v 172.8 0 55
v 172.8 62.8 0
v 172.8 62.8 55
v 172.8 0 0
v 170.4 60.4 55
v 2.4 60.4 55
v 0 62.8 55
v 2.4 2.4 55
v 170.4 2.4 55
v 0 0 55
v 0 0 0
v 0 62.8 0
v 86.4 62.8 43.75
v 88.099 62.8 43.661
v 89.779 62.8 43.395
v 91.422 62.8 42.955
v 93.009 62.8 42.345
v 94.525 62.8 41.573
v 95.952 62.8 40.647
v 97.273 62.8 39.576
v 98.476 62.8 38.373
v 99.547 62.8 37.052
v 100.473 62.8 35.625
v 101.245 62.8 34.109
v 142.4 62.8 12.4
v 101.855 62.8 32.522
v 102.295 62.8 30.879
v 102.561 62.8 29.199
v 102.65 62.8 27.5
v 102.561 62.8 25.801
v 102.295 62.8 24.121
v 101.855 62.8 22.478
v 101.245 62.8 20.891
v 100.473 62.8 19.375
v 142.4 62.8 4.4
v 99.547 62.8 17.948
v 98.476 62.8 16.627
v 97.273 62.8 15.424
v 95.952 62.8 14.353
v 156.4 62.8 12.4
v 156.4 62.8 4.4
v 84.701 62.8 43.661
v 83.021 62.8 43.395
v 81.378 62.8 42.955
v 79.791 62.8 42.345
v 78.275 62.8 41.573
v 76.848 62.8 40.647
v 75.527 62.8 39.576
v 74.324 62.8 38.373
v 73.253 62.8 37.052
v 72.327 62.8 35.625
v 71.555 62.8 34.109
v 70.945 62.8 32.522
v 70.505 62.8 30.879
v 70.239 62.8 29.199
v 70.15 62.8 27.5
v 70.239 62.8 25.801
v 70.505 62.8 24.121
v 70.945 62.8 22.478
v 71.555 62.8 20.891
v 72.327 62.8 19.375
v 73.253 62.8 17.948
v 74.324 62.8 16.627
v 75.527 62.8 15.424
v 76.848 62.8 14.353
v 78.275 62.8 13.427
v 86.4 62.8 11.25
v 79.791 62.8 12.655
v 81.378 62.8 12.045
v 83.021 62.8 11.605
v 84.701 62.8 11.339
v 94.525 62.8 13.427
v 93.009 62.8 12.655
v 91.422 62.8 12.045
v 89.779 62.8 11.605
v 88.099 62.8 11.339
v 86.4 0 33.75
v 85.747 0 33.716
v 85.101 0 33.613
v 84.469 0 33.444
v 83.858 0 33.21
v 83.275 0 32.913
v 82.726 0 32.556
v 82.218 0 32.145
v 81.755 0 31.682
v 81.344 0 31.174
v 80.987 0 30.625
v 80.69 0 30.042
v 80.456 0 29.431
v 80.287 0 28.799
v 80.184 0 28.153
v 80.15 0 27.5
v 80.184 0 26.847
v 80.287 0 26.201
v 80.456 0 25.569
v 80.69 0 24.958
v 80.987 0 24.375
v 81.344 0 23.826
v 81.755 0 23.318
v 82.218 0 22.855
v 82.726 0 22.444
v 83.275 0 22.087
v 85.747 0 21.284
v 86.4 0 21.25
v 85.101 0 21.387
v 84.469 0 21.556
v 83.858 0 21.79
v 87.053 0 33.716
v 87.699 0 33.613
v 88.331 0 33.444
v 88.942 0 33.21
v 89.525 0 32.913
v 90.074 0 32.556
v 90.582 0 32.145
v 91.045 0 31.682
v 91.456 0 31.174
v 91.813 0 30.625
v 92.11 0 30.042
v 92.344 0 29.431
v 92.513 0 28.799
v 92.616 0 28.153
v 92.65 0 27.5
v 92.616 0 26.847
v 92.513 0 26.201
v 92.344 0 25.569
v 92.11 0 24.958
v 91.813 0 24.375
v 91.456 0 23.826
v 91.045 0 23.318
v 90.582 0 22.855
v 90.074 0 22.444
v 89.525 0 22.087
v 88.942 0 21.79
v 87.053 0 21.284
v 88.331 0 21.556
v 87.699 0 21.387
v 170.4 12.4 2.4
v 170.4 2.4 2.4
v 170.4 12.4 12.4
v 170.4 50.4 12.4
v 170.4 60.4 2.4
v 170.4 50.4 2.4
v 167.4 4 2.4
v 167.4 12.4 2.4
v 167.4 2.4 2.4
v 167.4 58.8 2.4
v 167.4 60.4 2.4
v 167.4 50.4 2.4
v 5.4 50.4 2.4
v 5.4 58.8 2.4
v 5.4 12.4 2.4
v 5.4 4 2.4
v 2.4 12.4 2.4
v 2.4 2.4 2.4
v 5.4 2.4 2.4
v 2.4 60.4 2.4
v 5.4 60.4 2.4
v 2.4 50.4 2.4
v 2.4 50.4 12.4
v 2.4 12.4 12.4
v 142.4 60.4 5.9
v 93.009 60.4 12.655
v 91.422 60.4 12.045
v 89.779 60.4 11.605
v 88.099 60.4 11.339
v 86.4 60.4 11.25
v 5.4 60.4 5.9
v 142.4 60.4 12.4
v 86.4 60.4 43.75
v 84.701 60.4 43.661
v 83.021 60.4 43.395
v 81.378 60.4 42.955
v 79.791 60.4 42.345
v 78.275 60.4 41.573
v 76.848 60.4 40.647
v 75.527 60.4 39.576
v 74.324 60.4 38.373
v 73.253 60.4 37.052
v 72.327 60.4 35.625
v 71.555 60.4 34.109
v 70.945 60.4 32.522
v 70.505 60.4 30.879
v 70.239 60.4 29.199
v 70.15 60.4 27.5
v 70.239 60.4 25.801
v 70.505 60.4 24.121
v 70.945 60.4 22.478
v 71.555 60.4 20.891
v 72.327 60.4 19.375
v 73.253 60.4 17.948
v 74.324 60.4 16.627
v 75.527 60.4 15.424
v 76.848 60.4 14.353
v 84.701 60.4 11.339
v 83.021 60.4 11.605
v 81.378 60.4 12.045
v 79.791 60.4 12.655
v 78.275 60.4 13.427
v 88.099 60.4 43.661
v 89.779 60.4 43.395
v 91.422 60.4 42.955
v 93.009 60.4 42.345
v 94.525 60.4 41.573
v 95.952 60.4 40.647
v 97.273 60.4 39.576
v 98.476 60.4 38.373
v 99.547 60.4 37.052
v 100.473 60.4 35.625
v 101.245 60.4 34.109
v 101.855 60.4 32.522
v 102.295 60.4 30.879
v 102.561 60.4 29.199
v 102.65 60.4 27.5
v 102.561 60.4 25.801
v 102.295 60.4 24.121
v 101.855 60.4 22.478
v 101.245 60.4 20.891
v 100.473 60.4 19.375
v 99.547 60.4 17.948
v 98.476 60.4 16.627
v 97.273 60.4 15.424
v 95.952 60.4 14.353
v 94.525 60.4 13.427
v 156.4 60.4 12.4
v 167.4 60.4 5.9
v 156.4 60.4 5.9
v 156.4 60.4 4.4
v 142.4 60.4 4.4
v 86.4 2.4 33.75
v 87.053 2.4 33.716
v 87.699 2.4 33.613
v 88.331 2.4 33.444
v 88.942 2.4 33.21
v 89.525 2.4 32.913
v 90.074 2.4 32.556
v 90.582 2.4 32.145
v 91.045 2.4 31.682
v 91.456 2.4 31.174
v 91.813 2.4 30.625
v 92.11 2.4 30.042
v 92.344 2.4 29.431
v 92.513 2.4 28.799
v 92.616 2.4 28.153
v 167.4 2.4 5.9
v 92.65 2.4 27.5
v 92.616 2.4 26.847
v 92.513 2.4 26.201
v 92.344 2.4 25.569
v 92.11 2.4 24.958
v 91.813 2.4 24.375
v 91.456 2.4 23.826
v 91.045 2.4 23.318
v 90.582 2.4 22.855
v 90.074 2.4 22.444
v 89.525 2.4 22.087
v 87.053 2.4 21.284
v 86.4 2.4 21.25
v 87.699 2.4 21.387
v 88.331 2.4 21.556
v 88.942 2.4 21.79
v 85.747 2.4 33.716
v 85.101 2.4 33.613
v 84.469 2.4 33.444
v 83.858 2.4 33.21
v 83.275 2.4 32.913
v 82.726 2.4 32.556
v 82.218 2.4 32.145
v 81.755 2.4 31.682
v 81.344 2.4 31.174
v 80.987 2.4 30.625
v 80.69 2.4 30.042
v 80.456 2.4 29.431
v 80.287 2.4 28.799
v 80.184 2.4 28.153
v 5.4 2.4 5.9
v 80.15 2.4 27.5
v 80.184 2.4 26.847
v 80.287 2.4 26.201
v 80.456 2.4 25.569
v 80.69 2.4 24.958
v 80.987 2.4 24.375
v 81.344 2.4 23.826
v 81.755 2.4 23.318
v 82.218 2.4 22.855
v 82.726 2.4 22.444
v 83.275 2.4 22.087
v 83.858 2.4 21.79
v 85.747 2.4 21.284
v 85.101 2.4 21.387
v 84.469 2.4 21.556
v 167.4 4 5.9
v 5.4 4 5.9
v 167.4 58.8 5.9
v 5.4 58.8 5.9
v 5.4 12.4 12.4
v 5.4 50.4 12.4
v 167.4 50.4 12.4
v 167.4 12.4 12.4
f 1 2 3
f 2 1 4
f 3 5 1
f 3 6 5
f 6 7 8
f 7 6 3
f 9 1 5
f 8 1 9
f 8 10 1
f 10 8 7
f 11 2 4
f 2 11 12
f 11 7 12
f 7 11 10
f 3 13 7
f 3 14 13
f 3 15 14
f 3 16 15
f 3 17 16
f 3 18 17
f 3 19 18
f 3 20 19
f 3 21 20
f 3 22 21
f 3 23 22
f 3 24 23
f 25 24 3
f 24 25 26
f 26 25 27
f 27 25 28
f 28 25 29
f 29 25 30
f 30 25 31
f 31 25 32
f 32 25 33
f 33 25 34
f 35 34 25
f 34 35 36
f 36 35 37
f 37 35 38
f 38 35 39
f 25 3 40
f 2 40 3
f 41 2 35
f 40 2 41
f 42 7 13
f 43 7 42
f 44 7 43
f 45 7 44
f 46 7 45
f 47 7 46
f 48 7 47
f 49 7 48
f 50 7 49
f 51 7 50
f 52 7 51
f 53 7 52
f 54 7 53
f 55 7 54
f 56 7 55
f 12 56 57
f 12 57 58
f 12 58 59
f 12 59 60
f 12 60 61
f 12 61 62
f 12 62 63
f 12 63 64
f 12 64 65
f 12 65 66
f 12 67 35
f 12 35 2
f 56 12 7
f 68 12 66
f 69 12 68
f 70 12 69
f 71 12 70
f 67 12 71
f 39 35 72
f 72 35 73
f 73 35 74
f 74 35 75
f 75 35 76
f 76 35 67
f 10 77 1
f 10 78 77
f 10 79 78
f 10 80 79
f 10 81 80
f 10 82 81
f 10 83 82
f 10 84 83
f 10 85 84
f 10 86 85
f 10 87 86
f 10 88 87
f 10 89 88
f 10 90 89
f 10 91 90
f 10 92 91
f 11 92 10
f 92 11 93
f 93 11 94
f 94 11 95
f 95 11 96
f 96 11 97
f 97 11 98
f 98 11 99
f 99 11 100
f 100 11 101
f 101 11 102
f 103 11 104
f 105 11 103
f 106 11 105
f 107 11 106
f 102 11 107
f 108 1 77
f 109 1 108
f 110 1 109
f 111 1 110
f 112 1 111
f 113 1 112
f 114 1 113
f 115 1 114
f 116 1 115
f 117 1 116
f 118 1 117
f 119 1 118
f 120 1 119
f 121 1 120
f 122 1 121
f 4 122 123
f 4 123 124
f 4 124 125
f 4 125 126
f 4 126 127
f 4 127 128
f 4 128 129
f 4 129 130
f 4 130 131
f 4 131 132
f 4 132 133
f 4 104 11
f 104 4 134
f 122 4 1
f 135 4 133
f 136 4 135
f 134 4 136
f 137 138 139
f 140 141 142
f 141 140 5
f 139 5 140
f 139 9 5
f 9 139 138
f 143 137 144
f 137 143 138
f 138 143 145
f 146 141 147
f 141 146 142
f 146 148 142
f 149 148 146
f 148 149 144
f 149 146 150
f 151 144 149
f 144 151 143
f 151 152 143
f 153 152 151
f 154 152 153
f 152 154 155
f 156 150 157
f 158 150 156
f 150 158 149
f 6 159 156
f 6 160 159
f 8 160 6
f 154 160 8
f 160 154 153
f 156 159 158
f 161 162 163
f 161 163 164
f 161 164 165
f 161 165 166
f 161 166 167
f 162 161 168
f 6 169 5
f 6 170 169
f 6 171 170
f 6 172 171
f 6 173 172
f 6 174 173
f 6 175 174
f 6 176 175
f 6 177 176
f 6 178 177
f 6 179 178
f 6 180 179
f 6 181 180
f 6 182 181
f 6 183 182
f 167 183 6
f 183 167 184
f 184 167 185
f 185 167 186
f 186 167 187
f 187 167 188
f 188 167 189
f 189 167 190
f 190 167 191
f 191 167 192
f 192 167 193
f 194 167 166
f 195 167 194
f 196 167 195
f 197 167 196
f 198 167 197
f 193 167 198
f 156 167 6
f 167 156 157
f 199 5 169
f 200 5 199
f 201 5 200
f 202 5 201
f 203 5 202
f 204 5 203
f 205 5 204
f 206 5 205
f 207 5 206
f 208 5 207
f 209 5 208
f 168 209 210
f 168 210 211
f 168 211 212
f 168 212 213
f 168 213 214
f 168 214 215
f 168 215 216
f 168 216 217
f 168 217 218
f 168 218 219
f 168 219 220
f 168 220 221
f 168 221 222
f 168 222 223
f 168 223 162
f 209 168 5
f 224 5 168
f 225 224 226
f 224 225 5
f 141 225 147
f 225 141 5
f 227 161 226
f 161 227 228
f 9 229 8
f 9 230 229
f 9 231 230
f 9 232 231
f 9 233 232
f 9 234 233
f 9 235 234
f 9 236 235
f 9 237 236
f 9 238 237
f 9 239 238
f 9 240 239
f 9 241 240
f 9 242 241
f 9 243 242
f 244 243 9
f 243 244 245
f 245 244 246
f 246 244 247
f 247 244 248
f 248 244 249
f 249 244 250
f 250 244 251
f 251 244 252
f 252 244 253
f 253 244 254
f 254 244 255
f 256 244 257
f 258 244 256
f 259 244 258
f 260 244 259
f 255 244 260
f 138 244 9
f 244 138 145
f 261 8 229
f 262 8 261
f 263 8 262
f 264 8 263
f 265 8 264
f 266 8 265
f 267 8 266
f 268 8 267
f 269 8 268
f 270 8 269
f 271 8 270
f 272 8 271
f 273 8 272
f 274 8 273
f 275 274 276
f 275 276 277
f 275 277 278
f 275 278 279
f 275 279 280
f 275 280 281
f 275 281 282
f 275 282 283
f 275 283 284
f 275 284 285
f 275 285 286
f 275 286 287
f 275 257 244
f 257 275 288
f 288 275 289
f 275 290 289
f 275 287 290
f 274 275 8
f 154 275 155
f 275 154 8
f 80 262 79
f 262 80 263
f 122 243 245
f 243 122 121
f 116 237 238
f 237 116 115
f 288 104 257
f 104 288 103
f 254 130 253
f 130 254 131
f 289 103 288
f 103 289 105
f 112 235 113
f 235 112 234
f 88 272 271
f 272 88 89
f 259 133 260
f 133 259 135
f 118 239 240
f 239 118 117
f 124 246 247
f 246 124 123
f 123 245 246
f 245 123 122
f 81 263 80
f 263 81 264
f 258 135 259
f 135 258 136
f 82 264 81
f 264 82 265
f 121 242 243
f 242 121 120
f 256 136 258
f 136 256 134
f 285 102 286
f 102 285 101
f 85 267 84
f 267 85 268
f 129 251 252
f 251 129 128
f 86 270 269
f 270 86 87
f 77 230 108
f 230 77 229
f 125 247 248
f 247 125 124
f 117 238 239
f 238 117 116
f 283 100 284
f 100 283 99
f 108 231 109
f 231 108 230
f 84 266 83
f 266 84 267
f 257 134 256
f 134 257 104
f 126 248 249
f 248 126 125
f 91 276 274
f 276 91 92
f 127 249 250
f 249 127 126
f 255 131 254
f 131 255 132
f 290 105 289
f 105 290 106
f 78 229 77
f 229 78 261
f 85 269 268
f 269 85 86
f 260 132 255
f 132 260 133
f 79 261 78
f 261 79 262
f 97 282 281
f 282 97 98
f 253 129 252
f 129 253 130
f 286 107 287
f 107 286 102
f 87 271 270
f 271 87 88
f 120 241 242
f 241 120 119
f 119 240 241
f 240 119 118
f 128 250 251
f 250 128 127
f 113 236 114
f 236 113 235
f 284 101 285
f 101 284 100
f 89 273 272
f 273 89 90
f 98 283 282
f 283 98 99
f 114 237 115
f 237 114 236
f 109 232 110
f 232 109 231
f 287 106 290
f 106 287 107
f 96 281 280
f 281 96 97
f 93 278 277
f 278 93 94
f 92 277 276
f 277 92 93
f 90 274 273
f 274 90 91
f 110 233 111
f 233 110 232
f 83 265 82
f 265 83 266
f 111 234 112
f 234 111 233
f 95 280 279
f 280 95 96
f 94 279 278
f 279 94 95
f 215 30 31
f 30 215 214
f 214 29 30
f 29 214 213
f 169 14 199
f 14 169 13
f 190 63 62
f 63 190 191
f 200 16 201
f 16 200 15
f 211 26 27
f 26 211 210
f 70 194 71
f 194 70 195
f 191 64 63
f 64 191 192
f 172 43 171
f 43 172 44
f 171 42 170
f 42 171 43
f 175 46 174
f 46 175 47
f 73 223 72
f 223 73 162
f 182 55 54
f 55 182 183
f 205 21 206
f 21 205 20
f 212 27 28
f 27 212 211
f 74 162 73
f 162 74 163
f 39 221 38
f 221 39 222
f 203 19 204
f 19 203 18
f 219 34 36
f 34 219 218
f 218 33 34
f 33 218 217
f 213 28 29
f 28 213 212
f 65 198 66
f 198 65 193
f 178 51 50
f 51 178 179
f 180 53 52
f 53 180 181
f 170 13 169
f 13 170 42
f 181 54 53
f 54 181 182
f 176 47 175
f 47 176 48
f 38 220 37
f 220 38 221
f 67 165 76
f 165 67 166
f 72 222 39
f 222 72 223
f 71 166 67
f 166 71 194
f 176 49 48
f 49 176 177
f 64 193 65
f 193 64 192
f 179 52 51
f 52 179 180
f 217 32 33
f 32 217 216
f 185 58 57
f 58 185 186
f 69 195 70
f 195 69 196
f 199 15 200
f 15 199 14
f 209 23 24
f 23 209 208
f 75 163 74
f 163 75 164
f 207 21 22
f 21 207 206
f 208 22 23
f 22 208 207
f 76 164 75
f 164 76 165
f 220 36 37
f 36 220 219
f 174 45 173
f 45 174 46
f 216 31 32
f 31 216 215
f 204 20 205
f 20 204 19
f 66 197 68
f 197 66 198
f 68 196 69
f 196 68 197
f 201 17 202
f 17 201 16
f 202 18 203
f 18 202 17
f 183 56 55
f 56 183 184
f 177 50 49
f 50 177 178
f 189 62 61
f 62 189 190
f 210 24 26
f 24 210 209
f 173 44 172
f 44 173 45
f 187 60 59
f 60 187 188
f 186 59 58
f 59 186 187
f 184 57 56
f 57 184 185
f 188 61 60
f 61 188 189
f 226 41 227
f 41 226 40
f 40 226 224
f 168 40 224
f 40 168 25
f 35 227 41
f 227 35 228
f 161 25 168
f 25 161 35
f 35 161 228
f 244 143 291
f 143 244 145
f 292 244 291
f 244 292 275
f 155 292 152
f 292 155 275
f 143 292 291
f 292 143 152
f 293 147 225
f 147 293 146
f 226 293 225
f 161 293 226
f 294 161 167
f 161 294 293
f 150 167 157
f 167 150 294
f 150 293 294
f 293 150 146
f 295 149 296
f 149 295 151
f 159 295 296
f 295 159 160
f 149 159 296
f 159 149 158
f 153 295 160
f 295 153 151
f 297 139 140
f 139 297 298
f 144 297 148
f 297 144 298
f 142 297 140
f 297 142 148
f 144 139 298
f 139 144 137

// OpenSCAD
// =============================================================================
// Wake 睡眠环境守夜盒 · 无屏纯净版单件敞口盒 (16.5cm × 5.5cm 大面包板定制版)
// 设计者: 刘航成 & 夏工 & Antigravity
// 适用机型: 拓竹 Bambu Lab P1S / A1 / X1C / A1 mini
// 
// 核心改动依据用户最新反馈:
//   1. 【彻底去除外壳屏幕开孔】: 正面纯净实心，开发板与面包板完全内藏于敞口盒内。
//   2. 【正立面仅留 PIR 探头】: 前面板正中开设一颗精准的 AM412 PIR 人体红外球形孔 (Φ 12.5mm)。
//   3. 【氛围灯朝外对外发光】: WS2812 8位灯环安装在后外壁上，直接朝外向后墙打出漫反射环境柔光。
//   4. 【平整立面免开孔】: 左右侧立面保持平整平整，留足平整黏贴面供自粘 SPA06 和 BH1750。
//   5. 【单件一体成型】: 100% 免支撑，无顶盖零拼接，拓竹 35 分钟极速出件。
// =============================================================================

$fn = 60;

// 面包板尺寸 (标准 830 孔大面包板)
bb_len = 165.0;
bb_wid = 55.0;
bb_h   = 9.5;

// 外壳核心参数
wall = 2.4;           // 壁厚 (拓竹 0.4 喷嘴 6 圈实心)
inner_w = bb_len + 3.0; // 168.0mm (预留两侧卡扣与 0.5mm 拓竹收缩公差)
inner_d = bb_wid + 3.0; // 58.0mm
h_box   = 55.0;         // 降低到 55mm (无屏后高度更低矮协调，打印更极速)

outer_w = inner_w + 2 * wall; // 172.8mm
outer_d = inner_d + 2 * wall; // 62.8mm

// 传感器参数
pir_d = 12.5;          // AM412 PIR 探头直径
ws2812_ring_od = 32.5;  // WS2812 8位灯环外径
ws2812_ring_id = 17.5;  // 中心穿线孔

wake_clean_mvp_box();

module wake_clean_mvp_box() {
    difference() {
        // 1. 主外壳 (无顶盖纯净立方盒)
        cube([outer_w, outer_d, h_box]);

        // 2. 内部主敞口大内胆 (彻底掏空)
        translate([wall, wall, wall])
            cube([inner_w, inner_d, h_box + 1]);

        // 3. 【正前立壁】仅保留 AM412 PIR 人体红外圆孔 (居中偏上，正对下床动线)
        translate([outer_w / 2, -0.1, h_box / 2])
            rotate([-90, 0, 0])
                cylinder(d = pir_d, h = wall + 0.2);

        // 4. 【后外立壁】WS2812 8位灯环对外开孔/沉槽 (对外朝外发光！)
        // 槽深 1.8mm，让灯环朝外卡入对外照射
        translate([outer_w / 2, outer_d - wall - 0.1, h_box / 2])
            rotate([-90, 0, 0]) {
                cylinder(d = ws2812_ring_od, h = wall + 0.2); // 通孔对外全透光
            }

        // 5. 【后壁右下角】Type-C 供电/烧录线插口
        translate([outer_w - wall - 28, outer_d - wall - 0.1, wall + 2])
            cube([14, wall + 0.2, 8]);
    }

    // 6. 底座内部面包板前后防滑限位条 (精准 55.5mm 间距，卡死 16.5cm 大板)
    translate([wall + 3, wall, wall])
        cube([inner_w - 6, 1.6, 3.5]);
    translate([wall + 3, wall + inner_d - 1.6, wall])
        cube([inner_w - 6, 1.6, 3.5]);

    // 7. 左右两侧内壁平整支撑加强筋 (预留平整侧立面供方便粘贴 SPA06 与 BH1750)
    translate([wall, wall + 10, wall])
        cube([3.0, inner_d - 20, 10.0]);
    translate([outer_w - wall - 3.0, wall + 10, wall])
        cube([3.0, inner_d - 20, 10.0]);
}
